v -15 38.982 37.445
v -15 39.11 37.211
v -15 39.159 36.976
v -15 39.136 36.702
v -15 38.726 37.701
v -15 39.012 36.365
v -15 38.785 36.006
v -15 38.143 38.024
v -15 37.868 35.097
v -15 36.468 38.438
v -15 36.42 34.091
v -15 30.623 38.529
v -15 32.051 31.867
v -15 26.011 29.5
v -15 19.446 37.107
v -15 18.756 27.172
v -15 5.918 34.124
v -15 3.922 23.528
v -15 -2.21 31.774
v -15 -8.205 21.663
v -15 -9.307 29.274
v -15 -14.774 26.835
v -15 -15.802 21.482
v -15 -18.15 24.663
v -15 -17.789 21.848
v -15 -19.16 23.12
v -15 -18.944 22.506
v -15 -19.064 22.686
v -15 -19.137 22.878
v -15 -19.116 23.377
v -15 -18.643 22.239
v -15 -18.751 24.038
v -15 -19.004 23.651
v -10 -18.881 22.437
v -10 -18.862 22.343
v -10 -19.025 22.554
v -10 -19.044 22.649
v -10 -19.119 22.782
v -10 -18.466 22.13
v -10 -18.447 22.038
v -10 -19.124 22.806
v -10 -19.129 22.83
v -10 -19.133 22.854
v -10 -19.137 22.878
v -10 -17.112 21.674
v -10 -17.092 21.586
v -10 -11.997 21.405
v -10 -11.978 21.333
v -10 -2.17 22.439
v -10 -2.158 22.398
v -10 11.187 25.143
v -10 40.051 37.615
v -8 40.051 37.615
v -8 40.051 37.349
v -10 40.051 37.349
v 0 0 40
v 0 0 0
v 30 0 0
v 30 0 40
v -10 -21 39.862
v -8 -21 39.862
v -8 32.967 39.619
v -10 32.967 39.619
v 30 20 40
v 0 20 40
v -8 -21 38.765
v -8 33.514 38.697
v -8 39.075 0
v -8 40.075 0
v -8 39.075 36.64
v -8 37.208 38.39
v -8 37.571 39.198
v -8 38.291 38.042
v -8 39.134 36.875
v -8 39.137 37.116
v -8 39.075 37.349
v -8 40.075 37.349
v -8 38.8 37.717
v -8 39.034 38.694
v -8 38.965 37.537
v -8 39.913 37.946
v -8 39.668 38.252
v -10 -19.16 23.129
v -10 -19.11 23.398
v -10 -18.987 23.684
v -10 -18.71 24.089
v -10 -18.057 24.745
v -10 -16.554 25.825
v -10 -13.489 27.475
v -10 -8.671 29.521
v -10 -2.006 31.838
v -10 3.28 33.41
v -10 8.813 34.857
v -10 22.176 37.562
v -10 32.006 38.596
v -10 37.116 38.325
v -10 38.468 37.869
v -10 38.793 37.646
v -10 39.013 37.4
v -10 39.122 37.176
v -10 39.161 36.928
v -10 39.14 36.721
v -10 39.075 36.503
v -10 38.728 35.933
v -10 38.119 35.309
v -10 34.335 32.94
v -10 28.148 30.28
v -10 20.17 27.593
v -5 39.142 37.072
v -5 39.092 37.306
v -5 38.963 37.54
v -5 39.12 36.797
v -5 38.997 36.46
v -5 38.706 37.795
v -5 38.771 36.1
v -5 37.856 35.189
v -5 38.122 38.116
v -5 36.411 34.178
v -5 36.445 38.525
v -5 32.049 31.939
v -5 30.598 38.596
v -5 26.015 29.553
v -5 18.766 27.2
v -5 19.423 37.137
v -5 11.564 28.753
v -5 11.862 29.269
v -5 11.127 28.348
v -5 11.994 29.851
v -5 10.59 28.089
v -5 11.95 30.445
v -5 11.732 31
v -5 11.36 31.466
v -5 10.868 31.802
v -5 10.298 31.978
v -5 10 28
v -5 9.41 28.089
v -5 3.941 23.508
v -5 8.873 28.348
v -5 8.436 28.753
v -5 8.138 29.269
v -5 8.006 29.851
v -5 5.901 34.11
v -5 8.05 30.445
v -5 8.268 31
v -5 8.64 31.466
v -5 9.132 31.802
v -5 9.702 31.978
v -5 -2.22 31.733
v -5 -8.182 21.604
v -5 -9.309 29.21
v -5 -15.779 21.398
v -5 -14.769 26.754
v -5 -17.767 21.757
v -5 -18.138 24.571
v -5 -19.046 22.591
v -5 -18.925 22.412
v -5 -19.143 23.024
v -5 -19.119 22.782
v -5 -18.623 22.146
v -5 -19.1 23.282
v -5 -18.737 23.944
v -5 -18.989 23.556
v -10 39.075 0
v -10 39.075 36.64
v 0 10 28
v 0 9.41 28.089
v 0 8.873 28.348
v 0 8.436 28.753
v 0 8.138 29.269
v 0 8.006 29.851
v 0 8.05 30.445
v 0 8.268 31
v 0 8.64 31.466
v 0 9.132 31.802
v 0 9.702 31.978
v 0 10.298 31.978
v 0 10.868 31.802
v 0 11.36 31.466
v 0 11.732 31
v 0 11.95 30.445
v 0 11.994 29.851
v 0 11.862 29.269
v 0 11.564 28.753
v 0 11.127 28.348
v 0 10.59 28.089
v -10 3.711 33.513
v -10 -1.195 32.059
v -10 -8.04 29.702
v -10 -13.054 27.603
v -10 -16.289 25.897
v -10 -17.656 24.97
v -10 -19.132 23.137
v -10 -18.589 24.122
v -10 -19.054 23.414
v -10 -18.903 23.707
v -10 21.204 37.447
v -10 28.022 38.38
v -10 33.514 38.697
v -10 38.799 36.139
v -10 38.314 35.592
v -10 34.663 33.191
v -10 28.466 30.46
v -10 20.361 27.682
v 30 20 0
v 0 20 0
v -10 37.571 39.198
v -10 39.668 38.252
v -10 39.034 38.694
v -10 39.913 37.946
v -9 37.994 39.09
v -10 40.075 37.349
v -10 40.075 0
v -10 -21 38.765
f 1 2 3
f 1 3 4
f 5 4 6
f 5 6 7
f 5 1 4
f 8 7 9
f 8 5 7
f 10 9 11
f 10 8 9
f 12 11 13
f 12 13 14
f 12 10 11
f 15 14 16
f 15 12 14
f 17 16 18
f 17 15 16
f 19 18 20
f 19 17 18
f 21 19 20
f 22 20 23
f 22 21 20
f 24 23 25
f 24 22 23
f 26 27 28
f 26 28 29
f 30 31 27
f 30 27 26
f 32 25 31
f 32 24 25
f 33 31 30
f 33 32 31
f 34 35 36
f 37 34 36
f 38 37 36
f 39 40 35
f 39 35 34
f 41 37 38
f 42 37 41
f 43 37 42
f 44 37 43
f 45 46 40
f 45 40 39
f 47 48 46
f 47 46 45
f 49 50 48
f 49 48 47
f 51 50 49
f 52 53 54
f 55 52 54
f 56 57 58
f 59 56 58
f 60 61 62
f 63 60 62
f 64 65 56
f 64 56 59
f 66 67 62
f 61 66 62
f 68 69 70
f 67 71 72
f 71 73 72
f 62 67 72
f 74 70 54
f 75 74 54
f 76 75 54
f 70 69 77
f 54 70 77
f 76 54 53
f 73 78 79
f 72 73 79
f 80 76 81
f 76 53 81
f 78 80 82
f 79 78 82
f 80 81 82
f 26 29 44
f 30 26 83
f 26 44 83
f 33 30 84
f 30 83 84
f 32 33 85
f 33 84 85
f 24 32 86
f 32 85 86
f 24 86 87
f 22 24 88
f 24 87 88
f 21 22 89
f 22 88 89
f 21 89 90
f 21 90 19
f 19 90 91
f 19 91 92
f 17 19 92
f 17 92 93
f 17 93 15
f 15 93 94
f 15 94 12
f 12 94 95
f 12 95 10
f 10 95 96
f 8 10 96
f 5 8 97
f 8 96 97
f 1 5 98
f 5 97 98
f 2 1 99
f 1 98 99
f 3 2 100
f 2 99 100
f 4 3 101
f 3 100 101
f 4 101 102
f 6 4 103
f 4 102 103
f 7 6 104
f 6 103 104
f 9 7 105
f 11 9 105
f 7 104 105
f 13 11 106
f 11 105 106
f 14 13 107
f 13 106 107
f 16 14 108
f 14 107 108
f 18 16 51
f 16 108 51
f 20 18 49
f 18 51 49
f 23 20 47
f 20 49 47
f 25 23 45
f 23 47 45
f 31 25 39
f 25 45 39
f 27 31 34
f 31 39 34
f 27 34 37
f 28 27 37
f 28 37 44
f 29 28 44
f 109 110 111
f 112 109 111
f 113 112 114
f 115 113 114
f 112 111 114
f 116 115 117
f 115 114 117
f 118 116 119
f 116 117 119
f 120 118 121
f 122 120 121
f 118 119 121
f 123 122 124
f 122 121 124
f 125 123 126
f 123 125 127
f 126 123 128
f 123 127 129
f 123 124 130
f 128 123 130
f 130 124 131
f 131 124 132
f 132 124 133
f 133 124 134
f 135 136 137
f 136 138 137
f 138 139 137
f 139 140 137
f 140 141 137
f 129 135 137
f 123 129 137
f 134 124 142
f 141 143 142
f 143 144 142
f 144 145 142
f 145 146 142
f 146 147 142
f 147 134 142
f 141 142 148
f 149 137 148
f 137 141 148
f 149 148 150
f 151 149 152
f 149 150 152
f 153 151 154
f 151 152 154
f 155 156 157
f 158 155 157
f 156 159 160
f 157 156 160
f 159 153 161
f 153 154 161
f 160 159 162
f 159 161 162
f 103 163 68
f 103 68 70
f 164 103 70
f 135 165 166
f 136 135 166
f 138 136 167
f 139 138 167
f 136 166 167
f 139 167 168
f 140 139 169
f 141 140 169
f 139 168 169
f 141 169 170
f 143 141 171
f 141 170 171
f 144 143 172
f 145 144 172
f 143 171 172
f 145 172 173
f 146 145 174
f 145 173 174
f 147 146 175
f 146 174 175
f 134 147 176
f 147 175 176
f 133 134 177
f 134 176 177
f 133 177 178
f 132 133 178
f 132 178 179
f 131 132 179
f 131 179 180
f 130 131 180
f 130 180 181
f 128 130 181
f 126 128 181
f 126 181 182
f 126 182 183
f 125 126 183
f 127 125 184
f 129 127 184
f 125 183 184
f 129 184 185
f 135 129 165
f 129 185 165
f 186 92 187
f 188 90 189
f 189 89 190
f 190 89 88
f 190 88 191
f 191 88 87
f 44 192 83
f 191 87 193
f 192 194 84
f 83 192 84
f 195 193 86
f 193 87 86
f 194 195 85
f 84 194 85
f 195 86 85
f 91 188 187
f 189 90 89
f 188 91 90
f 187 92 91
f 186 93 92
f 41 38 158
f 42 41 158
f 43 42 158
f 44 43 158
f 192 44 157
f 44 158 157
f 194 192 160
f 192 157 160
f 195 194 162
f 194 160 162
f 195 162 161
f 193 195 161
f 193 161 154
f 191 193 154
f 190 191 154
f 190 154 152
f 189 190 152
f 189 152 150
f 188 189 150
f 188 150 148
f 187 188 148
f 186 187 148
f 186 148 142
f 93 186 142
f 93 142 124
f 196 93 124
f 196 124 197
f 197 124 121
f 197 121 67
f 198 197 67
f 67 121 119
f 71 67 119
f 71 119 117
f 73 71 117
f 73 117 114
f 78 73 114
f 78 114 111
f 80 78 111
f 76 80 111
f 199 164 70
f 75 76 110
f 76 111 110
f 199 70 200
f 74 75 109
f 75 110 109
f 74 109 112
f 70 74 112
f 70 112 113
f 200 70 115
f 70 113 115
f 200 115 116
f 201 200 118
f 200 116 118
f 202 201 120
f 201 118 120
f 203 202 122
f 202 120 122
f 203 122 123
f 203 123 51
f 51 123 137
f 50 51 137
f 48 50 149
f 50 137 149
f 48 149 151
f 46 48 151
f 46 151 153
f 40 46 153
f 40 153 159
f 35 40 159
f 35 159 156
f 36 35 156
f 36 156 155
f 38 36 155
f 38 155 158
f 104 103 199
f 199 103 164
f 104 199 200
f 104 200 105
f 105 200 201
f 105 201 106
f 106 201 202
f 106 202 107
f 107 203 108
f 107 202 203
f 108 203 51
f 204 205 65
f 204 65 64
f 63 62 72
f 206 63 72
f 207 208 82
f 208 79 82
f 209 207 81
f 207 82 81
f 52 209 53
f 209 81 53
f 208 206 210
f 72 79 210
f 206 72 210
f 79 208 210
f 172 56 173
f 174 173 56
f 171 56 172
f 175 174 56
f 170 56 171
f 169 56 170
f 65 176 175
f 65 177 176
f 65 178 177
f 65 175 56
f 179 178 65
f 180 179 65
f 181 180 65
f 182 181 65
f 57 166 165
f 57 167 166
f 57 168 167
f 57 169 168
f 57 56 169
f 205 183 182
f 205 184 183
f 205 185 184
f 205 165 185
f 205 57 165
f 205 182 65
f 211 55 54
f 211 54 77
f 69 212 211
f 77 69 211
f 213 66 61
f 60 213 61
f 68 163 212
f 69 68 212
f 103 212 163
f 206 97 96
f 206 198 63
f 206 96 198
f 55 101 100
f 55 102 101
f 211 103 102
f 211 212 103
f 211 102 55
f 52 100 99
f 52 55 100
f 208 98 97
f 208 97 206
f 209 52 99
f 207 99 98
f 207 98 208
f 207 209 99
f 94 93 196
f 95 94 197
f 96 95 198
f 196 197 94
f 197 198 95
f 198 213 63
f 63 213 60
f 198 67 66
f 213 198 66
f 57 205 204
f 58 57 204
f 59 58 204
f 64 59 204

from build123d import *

# Parameters (mm, degrees)
SKETCH_1_W      = 30
SKETCH_1_H      = 20
EXTRUDE_1_DEPTH = 40
SKETCH_2_R      = 2
EXTRUDE_2_DEPTH = 5
SKETCH_3_RX     = 30
SKETCH_3_RY     = 5
EXTRUDE_3_DEPTH = 5
SKETCH_4_W      = 37.348500324
SKETCH_4_H      = 1
EXTRUDE_4_DEPTH = 2
EXTRUDE_START   = -2
EXTRUDE_5_DEPTH = 2
SKETCH_6_RX     = 29.994547564
SKETCH_6_RY     = 5.00002525
EXTRUDE_6_DEPTH = 5


# Read off the part's stored shape, not the designer's step: 凸台-拉伸5
with BuildPart() as part:
    # 草图1 → 凸台-拉伸1 (new body)
    with BuildSketch(Plane.XY):
        with Locations((15, 10)):
            Rectangle(SKETCH_1_W, SKETCH_1_H)
    extrude(amount=EXTRUDE_1_DEPTH)

    # 草图2 → 凸台-拉伸2 (add)
    with BuildSketch(Plane.ZY):
        with Locations(Location((30, 10, 0), (0, 0, 180))):
            Circle(SKETCH_2_R)
    extrude(amount=EXTRUDE_2_DEPTH)

    # 草图3 → 凸台-拉伸3 (add)
    with BuildSketch(Plane.ZY.offset(5)):
        with Locations(Location((30, 10), (0, 0, -103.92099691))):
            Ellipse(SKETCH_3_RX, SKETCH_3_RY)
    extrude(amount=EXTRUDE_3_DEPTH)

    # 草图4 → 凸台-拉伸4 (add)
    with BuildSketch(Plane.ZY.offset(10)):
        with Locations((18.674250162, 39.574648358)):
            Rectangle(SKETCH_4_W, SKETCH_4_H)
    extrude(amount=-EXTRUDE_4_DEPTH)

    # 凸台-拉伸5 outline → 凸台-拉伸5 (add)
    with BuildSketch(Plane.ZY.offset(10).offset(EXTRUDE_START)):
        with BuildLine():
            Line((39.862468471, -21), (39.619125683, 32.967296936))
            add(Edge.make_bspline(
                [(39.619125683, 32.967296936), (39.589392589, 39.561347803), (37.614649654, 40.050686248)],
                knots=[5.629361553, 5.629361553, 5.629361553, 6.283185307, 6.283185307, 6.283185307], degree=2, weights=[1, 0.947038516, 1]))
            Line((37.614649654, 40.050686248), (37.348500324, 40.050855796))
            Line((37.348500324, 40.050855796), (37.348500324, 39.074648358))
            add(Edge.make_bspline(
                [(38.697434301, 33.514015855), (38.694345199, 38.494694197), (37.348500324, 39.074648358)],
                knots=[5.657287765, 5.657287765, 5.657287765, 6.250122592, 6.250122592, 6.250122592], degree=2, weights=[0.790463711, 0.847402464, 0.984462923]))
            Line((38.697434301, 33.514015855), (38.765118588, -21))
            Line((38.765118588, -21), (39.862468471, -21))
        make_face()
    extrude(amount=EXTRUDE_5_DEPTH)

    # 草图6 → 凸台-拉伸6 (add)
    with BuildSketch(Plane.ZY.offset(10)):
        with Locations(Location((30, 10), (0, 0, -103.736326108))):
            Ellipse(SKETCH_6_RX, SKETCH_6_RY)
    extrude(amount=EXTRUDE_6_DEPTH)


solid = part.part
